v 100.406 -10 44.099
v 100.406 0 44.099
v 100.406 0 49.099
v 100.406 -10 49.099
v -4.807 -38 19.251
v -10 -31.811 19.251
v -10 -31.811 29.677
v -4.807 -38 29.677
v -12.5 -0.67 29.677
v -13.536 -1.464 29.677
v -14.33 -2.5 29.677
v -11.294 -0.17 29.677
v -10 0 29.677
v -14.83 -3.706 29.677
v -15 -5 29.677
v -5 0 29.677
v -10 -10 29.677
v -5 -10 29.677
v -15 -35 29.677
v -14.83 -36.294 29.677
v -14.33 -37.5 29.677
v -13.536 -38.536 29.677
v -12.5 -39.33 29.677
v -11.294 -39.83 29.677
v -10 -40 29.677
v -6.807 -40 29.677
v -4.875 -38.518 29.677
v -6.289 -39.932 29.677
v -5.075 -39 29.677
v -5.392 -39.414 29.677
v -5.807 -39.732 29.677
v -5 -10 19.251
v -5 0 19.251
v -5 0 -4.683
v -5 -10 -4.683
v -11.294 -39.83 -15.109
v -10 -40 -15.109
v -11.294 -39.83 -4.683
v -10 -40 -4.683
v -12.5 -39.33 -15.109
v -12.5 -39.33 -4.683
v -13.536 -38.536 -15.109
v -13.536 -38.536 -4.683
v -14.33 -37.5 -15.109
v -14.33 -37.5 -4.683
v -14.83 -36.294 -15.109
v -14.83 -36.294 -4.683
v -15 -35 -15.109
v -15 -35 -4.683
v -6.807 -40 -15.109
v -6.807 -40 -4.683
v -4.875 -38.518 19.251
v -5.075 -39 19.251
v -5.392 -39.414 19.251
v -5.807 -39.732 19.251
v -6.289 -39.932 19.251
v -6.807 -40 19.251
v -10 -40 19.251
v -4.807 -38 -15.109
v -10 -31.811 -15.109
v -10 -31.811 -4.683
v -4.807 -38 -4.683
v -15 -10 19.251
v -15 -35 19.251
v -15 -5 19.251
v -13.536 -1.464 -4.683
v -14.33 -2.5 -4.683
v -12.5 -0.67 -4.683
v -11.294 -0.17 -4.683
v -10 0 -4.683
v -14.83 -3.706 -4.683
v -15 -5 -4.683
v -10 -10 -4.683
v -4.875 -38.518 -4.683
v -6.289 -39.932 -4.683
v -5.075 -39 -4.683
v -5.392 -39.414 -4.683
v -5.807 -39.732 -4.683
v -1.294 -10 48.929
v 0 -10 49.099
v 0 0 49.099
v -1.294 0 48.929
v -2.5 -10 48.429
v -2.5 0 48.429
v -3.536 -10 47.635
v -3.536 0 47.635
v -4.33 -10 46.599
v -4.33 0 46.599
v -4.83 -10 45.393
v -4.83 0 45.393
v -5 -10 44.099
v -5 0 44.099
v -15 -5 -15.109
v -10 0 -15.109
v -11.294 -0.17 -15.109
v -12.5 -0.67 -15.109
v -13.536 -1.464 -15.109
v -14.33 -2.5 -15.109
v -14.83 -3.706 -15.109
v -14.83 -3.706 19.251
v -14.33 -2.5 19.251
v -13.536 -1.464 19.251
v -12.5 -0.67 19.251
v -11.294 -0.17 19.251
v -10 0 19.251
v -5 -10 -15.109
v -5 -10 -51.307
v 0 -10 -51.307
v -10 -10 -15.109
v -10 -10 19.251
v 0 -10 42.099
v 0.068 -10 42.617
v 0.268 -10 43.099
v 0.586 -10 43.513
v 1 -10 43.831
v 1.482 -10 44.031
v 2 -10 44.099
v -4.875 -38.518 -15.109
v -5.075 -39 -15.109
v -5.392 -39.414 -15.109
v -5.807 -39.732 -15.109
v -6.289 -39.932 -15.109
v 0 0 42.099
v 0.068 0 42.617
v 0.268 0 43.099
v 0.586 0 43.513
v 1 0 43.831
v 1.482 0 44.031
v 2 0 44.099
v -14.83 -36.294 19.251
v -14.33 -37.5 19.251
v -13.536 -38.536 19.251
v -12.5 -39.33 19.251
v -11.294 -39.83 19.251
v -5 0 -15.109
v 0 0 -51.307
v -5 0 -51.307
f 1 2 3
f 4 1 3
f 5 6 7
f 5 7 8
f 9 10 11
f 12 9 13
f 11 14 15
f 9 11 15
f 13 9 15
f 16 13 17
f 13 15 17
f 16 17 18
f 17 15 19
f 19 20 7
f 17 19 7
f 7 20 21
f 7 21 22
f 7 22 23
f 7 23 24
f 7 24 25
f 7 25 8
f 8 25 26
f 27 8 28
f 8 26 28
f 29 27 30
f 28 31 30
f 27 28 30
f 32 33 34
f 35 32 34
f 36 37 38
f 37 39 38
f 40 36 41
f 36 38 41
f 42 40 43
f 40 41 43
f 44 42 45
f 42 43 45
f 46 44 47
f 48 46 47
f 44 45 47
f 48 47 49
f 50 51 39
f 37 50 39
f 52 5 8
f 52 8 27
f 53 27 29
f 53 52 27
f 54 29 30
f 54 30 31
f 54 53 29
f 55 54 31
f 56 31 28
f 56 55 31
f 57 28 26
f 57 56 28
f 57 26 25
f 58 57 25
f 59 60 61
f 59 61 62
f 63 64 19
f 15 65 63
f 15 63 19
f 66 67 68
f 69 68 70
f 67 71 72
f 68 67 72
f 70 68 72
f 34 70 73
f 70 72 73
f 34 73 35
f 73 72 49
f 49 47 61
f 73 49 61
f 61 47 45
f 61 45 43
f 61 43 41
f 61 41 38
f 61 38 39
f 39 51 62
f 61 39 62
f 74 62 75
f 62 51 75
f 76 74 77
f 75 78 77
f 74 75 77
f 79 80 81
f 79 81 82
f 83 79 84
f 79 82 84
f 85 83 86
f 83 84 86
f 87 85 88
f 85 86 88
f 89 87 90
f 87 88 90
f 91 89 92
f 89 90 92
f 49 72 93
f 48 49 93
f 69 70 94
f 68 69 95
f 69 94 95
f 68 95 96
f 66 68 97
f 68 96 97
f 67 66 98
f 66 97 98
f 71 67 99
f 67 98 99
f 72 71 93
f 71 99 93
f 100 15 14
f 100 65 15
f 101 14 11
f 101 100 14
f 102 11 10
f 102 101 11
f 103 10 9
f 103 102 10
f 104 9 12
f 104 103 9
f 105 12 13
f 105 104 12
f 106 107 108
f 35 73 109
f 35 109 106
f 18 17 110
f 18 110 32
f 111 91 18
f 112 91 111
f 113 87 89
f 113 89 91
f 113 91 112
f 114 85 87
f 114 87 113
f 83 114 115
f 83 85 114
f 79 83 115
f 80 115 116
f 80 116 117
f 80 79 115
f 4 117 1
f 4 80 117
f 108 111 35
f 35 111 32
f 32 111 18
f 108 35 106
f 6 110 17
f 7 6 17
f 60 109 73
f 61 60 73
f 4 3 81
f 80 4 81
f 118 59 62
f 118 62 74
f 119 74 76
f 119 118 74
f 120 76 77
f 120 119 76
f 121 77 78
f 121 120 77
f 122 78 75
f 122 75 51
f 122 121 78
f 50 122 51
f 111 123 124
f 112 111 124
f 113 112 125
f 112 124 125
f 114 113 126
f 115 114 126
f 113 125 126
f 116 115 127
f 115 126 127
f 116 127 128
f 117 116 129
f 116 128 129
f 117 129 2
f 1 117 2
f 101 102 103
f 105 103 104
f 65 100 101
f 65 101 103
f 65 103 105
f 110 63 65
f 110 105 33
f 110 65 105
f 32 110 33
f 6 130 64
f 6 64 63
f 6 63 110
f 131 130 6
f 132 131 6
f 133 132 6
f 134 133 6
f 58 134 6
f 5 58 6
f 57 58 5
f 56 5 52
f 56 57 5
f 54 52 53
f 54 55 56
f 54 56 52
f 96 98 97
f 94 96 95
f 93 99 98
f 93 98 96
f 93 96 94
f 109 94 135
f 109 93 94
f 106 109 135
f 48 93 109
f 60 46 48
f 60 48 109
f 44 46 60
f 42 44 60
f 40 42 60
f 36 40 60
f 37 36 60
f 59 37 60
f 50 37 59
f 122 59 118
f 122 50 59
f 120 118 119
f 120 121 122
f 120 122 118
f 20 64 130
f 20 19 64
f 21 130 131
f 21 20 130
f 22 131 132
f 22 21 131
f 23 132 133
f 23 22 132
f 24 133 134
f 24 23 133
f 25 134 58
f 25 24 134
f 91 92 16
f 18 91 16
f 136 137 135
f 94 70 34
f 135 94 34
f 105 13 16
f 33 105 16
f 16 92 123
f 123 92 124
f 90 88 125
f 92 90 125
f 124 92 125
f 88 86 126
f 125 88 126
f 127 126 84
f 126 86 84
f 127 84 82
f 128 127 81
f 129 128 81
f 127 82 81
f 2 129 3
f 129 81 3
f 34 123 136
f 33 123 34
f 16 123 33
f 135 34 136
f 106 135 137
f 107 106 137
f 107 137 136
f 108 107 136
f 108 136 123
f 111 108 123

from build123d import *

# Parameters (mm, degrees)
F1_DEPTH = 10
F2_W     = 5
F2_H     = 10.4262067128
F3_DEPTH = 30
F4_R     = 4.99999
F6_DEPTH = 10.4262067128
F8_DEPTH = 10.4262067128


# Not quite as in the source:
# - a fillet or chamfer is up to 0.001 mm smaller than in the source, because OpenCascade refuses the exact size


with BuildPart() as f1:
    # F0 (on Front) → F1 (new body)
    with BuildSketch(Plane.XZ):
        with BuildLine():
            Line((-5, -51.3071772588), (0, -51.3071772588))
            Line((0, -51.3071772588), (0, 42.0990820395))
            ThreePointArc((0, 42.0990820395), (0.5857864376, 43.5132956019), (2, 44.0990820395))
            Line((2, 44.0990820395), (100.4062592983, 44.0990820395))
            Line((100.4062592983, 44.0990820395), (100.4062592983, 49.0990820395))
            Line((100.4062592983, 49.0990820395), (0, 49.0990820395))
            ThreePointArc((0, 49.0990820395), (-3.5355339059, 47.6346159455), (-5, 44.0990820395))
            Line((-5, 44.0990820395), (-5, 29.6768955886))
            Line((-5, 29.6768955886), (-15, 29.6768955886))
            Line((-15, 29.6768955886), (-15, 19.2506888759))
            Line((-15, 19.2506888759), (-5, 19.2506888759))
            Line((-5, 19.2506888759), (-5, -4.6830929693))
            Line((-5, -4.6830929693), (-15, -4.6830929693))
            Line((-15, -4.6830929693), (-15, -15.1092996821))
            Line((-15, -15.1092996821), (-5, -15.1092996821))
            Line((-5, -15.1092996821), (-5, -51.3071772588))
        make_face()
    extrude(amount=F1_DEPTH)

    # F2 (on face) → F3 (join)
    with BuildSketch(Plane.XZ.offset(10)):
        with Locations((-12.5, 24.4637922322)):
            Rectangle(F2_W, F2_H)
        with Locations((-12.5, -9.8961963257)):
            Rectangle(F2_W, F2_H)
    extrude(amount=F3_DEPTH)

    # F4 (radius 5 in the source; OpenCascade refuses exactly that, so slightly less here)
    f4_edges = [f1.edges().sort_by_distance(p)[0] for p in [
        (-15, -40, 24.463792),
        (-15, -40, -9.896196),
        (-15, 0, 24.463792),
        (-15, 0, -9.896196),
    ]]
    fillet(f4_edges, radius=F4_R)

    # F5 (on face) → F6 (join, through all)
    with BuildSketch(Plane(origin=(0, 0, -15.1092996821), x_dir=(1, 0, 0), z_dir=(0, 0, -1))):
        with BuildLine():
            Line((-6.8065949231, 40), (-10, 40))
            Line((-10, 40), (-10, 31.8107408419))
            Line((-10, 31.8107408419), (-4.8065949231, 38))
            ThreePointArc((-4.8065949231, 38), (-5.3923813608, 39.4142135624), (-6.8065949231, 40))
        make_face()
    extrude(amount=-F6_DEPTH)

    # F7 (on face) → F8 (join, through all)
    with BuildSketch(Plane(origin=(0, 0, 19.2506888759), x_dir=(1, 0, 0), z_dir=(0, 0, -1))):
        with BuildLine():
            Line((-6.8065949231, 40), (-10, 40))
            Line((-10, 40), (-10, 31.8107408419))
            Line((-10, 31.8107408419), (-4.8065949231, 38))
            ThreePointArc((-4.8065949231, 38), (-5.3923813608, 39.4142135624), (-6.8065949231, 40))
        make_face()
    extrude(amount=-F8_DEPTH)


solid = f1.part
